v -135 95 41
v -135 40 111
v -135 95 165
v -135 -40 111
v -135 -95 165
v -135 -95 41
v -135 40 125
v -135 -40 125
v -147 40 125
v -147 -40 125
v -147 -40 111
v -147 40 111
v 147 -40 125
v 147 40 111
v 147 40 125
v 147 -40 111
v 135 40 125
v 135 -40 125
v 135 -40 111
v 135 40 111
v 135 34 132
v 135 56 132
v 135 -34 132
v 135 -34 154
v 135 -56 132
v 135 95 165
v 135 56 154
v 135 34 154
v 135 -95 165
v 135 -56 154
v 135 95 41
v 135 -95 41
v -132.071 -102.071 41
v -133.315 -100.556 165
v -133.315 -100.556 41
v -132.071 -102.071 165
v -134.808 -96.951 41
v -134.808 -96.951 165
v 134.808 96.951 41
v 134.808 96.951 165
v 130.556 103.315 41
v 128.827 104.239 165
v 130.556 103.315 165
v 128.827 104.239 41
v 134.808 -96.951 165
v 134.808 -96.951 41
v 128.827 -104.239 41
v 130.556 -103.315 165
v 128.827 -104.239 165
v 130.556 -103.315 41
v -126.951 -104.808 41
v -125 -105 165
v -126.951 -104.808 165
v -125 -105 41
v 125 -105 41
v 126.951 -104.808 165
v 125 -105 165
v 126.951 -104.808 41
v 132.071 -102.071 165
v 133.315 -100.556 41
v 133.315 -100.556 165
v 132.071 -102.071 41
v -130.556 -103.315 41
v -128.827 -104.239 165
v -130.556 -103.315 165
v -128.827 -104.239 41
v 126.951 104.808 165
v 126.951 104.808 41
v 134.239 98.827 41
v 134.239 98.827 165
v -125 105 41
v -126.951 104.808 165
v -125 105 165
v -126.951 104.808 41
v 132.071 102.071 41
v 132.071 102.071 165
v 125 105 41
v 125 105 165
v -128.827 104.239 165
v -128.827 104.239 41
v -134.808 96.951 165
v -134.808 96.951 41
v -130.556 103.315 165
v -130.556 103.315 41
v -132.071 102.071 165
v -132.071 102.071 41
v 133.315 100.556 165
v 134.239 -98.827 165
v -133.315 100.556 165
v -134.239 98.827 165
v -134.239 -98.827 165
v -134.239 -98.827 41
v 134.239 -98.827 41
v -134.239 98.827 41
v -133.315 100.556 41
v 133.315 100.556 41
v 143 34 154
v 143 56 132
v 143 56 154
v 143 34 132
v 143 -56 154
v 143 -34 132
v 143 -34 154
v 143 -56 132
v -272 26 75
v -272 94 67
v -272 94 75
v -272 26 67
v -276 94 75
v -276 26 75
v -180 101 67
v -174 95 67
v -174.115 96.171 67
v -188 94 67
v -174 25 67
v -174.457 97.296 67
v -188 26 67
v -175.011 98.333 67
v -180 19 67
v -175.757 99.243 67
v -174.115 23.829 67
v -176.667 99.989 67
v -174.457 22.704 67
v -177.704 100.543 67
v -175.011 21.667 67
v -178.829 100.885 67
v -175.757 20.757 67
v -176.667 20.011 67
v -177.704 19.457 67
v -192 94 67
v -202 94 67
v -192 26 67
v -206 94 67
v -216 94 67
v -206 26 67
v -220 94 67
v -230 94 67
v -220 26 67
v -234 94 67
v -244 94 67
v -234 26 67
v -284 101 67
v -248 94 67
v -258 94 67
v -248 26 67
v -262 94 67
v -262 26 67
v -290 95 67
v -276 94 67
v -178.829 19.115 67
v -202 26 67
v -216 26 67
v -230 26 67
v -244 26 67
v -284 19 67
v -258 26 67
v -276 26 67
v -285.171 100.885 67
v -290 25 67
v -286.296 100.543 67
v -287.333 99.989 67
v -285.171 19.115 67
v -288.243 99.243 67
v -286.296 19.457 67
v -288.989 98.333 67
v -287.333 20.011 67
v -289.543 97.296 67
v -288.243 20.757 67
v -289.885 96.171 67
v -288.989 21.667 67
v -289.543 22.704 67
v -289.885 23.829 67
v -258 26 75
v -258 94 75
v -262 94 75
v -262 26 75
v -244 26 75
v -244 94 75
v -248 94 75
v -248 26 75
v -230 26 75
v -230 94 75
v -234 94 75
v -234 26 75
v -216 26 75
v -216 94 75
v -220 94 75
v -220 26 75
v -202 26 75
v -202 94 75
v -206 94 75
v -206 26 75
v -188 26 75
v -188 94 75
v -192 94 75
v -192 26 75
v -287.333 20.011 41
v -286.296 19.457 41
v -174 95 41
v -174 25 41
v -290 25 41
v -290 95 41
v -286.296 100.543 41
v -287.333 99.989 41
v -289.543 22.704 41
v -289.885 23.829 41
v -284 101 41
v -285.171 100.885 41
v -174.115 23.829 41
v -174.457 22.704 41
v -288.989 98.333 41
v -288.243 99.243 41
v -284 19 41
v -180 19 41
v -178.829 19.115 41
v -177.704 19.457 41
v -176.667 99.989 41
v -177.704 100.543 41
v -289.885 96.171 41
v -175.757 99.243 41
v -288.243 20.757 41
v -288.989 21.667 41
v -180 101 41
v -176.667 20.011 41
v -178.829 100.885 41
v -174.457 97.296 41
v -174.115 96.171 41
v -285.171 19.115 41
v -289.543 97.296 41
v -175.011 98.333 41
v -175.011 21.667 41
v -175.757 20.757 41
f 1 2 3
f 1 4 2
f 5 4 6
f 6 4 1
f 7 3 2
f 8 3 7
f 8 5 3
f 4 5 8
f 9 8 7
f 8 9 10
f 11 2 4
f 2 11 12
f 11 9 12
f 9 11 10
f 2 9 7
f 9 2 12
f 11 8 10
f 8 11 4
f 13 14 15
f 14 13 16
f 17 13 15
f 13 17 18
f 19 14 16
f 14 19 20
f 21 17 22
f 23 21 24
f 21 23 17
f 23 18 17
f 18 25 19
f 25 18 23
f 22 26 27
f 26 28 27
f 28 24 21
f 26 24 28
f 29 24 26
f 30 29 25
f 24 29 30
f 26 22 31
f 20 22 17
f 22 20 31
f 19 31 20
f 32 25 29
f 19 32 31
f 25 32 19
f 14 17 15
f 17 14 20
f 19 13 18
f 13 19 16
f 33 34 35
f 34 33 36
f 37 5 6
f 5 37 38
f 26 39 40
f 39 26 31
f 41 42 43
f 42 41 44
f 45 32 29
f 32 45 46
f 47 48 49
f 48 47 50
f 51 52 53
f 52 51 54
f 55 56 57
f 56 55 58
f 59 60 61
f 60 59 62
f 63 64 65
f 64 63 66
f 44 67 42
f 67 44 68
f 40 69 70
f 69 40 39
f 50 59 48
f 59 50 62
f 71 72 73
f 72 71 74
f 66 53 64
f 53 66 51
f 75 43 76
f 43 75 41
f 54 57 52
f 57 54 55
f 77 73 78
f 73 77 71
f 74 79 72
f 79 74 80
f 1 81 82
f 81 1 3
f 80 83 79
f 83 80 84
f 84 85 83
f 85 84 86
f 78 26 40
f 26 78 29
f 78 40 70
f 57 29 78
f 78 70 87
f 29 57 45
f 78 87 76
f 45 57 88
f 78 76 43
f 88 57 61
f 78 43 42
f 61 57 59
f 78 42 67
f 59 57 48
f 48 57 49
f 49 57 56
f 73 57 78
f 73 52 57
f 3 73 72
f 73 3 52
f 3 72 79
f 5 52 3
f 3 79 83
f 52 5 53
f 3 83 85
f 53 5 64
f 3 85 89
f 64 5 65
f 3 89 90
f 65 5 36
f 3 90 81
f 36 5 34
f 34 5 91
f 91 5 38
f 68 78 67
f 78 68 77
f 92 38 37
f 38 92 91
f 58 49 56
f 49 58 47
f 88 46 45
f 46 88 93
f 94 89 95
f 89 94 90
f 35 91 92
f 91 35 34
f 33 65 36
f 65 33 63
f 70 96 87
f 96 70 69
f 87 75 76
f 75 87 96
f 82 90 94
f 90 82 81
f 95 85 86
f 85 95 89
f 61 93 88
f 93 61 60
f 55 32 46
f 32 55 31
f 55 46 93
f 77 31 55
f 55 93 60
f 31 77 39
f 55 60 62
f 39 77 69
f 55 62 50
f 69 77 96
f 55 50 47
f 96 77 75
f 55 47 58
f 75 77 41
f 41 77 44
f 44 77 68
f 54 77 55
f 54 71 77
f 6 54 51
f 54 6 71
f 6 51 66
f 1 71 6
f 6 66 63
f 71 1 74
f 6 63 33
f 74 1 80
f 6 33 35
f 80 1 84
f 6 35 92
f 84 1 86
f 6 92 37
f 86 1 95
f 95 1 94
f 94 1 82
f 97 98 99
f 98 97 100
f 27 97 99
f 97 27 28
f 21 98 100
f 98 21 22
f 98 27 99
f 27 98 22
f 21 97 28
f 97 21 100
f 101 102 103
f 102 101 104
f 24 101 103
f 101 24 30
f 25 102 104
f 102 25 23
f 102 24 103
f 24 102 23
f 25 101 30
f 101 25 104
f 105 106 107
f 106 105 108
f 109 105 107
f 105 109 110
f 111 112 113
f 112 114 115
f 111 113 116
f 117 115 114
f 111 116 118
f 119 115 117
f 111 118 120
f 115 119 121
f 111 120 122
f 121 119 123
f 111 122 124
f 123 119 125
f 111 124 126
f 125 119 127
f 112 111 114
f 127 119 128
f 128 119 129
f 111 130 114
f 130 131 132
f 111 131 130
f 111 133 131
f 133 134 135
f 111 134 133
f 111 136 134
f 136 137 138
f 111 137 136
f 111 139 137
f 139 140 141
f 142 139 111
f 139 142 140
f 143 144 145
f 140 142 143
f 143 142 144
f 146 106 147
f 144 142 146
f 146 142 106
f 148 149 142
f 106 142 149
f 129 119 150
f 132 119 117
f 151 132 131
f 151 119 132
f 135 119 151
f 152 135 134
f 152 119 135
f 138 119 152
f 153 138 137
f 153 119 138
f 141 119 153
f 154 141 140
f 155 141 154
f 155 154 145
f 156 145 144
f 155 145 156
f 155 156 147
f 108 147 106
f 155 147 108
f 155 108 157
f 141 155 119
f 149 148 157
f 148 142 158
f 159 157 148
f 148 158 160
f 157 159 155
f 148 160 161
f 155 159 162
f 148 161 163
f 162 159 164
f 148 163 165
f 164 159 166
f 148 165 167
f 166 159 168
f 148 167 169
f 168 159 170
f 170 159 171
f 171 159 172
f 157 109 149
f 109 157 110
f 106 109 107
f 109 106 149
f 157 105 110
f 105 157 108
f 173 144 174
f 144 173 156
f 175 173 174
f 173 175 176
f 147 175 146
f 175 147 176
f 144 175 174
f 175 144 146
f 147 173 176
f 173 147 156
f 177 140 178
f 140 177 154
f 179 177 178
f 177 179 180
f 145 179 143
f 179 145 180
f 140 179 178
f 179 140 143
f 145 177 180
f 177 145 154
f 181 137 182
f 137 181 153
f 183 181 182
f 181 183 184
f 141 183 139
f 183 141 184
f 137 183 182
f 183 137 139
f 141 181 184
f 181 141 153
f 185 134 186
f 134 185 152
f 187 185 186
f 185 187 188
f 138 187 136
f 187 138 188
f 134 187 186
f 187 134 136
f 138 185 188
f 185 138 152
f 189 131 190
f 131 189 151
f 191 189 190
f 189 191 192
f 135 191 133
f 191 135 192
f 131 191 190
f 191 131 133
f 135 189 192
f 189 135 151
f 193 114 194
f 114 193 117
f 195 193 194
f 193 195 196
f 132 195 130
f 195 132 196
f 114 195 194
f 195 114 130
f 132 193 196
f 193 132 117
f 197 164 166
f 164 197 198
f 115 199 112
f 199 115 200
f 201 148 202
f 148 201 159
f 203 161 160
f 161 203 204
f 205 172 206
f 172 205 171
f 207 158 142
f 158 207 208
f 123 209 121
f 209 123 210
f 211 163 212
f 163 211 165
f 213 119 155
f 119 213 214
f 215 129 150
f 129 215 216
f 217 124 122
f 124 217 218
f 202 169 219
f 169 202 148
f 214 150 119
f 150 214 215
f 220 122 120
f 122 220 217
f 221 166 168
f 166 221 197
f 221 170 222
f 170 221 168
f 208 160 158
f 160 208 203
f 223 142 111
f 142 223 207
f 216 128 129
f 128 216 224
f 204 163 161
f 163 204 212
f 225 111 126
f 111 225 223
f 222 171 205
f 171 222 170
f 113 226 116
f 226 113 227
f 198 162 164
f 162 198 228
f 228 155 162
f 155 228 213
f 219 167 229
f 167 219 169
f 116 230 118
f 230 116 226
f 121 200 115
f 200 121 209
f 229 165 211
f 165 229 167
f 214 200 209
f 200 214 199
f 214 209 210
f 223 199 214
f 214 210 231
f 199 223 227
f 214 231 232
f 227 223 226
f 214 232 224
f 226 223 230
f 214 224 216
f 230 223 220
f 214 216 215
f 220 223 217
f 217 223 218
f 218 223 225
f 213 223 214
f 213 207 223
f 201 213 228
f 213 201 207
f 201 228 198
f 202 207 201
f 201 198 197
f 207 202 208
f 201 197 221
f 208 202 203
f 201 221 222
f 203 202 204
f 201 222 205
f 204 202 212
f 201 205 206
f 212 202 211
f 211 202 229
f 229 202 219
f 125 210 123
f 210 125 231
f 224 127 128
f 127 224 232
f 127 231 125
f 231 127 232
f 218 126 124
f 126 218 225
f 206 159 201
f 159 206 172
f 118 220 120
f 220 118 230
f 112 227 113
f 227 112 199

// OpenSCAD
// ============================================================================
// FILE: export_battery_system.scad
// OUTPUT: battery_system_visual.stl
// URDF LINK: battery_system_link
// ============================================================================

export_only = true;

include <main.scad>

union() {
    battery_pack();
    bms();
}
